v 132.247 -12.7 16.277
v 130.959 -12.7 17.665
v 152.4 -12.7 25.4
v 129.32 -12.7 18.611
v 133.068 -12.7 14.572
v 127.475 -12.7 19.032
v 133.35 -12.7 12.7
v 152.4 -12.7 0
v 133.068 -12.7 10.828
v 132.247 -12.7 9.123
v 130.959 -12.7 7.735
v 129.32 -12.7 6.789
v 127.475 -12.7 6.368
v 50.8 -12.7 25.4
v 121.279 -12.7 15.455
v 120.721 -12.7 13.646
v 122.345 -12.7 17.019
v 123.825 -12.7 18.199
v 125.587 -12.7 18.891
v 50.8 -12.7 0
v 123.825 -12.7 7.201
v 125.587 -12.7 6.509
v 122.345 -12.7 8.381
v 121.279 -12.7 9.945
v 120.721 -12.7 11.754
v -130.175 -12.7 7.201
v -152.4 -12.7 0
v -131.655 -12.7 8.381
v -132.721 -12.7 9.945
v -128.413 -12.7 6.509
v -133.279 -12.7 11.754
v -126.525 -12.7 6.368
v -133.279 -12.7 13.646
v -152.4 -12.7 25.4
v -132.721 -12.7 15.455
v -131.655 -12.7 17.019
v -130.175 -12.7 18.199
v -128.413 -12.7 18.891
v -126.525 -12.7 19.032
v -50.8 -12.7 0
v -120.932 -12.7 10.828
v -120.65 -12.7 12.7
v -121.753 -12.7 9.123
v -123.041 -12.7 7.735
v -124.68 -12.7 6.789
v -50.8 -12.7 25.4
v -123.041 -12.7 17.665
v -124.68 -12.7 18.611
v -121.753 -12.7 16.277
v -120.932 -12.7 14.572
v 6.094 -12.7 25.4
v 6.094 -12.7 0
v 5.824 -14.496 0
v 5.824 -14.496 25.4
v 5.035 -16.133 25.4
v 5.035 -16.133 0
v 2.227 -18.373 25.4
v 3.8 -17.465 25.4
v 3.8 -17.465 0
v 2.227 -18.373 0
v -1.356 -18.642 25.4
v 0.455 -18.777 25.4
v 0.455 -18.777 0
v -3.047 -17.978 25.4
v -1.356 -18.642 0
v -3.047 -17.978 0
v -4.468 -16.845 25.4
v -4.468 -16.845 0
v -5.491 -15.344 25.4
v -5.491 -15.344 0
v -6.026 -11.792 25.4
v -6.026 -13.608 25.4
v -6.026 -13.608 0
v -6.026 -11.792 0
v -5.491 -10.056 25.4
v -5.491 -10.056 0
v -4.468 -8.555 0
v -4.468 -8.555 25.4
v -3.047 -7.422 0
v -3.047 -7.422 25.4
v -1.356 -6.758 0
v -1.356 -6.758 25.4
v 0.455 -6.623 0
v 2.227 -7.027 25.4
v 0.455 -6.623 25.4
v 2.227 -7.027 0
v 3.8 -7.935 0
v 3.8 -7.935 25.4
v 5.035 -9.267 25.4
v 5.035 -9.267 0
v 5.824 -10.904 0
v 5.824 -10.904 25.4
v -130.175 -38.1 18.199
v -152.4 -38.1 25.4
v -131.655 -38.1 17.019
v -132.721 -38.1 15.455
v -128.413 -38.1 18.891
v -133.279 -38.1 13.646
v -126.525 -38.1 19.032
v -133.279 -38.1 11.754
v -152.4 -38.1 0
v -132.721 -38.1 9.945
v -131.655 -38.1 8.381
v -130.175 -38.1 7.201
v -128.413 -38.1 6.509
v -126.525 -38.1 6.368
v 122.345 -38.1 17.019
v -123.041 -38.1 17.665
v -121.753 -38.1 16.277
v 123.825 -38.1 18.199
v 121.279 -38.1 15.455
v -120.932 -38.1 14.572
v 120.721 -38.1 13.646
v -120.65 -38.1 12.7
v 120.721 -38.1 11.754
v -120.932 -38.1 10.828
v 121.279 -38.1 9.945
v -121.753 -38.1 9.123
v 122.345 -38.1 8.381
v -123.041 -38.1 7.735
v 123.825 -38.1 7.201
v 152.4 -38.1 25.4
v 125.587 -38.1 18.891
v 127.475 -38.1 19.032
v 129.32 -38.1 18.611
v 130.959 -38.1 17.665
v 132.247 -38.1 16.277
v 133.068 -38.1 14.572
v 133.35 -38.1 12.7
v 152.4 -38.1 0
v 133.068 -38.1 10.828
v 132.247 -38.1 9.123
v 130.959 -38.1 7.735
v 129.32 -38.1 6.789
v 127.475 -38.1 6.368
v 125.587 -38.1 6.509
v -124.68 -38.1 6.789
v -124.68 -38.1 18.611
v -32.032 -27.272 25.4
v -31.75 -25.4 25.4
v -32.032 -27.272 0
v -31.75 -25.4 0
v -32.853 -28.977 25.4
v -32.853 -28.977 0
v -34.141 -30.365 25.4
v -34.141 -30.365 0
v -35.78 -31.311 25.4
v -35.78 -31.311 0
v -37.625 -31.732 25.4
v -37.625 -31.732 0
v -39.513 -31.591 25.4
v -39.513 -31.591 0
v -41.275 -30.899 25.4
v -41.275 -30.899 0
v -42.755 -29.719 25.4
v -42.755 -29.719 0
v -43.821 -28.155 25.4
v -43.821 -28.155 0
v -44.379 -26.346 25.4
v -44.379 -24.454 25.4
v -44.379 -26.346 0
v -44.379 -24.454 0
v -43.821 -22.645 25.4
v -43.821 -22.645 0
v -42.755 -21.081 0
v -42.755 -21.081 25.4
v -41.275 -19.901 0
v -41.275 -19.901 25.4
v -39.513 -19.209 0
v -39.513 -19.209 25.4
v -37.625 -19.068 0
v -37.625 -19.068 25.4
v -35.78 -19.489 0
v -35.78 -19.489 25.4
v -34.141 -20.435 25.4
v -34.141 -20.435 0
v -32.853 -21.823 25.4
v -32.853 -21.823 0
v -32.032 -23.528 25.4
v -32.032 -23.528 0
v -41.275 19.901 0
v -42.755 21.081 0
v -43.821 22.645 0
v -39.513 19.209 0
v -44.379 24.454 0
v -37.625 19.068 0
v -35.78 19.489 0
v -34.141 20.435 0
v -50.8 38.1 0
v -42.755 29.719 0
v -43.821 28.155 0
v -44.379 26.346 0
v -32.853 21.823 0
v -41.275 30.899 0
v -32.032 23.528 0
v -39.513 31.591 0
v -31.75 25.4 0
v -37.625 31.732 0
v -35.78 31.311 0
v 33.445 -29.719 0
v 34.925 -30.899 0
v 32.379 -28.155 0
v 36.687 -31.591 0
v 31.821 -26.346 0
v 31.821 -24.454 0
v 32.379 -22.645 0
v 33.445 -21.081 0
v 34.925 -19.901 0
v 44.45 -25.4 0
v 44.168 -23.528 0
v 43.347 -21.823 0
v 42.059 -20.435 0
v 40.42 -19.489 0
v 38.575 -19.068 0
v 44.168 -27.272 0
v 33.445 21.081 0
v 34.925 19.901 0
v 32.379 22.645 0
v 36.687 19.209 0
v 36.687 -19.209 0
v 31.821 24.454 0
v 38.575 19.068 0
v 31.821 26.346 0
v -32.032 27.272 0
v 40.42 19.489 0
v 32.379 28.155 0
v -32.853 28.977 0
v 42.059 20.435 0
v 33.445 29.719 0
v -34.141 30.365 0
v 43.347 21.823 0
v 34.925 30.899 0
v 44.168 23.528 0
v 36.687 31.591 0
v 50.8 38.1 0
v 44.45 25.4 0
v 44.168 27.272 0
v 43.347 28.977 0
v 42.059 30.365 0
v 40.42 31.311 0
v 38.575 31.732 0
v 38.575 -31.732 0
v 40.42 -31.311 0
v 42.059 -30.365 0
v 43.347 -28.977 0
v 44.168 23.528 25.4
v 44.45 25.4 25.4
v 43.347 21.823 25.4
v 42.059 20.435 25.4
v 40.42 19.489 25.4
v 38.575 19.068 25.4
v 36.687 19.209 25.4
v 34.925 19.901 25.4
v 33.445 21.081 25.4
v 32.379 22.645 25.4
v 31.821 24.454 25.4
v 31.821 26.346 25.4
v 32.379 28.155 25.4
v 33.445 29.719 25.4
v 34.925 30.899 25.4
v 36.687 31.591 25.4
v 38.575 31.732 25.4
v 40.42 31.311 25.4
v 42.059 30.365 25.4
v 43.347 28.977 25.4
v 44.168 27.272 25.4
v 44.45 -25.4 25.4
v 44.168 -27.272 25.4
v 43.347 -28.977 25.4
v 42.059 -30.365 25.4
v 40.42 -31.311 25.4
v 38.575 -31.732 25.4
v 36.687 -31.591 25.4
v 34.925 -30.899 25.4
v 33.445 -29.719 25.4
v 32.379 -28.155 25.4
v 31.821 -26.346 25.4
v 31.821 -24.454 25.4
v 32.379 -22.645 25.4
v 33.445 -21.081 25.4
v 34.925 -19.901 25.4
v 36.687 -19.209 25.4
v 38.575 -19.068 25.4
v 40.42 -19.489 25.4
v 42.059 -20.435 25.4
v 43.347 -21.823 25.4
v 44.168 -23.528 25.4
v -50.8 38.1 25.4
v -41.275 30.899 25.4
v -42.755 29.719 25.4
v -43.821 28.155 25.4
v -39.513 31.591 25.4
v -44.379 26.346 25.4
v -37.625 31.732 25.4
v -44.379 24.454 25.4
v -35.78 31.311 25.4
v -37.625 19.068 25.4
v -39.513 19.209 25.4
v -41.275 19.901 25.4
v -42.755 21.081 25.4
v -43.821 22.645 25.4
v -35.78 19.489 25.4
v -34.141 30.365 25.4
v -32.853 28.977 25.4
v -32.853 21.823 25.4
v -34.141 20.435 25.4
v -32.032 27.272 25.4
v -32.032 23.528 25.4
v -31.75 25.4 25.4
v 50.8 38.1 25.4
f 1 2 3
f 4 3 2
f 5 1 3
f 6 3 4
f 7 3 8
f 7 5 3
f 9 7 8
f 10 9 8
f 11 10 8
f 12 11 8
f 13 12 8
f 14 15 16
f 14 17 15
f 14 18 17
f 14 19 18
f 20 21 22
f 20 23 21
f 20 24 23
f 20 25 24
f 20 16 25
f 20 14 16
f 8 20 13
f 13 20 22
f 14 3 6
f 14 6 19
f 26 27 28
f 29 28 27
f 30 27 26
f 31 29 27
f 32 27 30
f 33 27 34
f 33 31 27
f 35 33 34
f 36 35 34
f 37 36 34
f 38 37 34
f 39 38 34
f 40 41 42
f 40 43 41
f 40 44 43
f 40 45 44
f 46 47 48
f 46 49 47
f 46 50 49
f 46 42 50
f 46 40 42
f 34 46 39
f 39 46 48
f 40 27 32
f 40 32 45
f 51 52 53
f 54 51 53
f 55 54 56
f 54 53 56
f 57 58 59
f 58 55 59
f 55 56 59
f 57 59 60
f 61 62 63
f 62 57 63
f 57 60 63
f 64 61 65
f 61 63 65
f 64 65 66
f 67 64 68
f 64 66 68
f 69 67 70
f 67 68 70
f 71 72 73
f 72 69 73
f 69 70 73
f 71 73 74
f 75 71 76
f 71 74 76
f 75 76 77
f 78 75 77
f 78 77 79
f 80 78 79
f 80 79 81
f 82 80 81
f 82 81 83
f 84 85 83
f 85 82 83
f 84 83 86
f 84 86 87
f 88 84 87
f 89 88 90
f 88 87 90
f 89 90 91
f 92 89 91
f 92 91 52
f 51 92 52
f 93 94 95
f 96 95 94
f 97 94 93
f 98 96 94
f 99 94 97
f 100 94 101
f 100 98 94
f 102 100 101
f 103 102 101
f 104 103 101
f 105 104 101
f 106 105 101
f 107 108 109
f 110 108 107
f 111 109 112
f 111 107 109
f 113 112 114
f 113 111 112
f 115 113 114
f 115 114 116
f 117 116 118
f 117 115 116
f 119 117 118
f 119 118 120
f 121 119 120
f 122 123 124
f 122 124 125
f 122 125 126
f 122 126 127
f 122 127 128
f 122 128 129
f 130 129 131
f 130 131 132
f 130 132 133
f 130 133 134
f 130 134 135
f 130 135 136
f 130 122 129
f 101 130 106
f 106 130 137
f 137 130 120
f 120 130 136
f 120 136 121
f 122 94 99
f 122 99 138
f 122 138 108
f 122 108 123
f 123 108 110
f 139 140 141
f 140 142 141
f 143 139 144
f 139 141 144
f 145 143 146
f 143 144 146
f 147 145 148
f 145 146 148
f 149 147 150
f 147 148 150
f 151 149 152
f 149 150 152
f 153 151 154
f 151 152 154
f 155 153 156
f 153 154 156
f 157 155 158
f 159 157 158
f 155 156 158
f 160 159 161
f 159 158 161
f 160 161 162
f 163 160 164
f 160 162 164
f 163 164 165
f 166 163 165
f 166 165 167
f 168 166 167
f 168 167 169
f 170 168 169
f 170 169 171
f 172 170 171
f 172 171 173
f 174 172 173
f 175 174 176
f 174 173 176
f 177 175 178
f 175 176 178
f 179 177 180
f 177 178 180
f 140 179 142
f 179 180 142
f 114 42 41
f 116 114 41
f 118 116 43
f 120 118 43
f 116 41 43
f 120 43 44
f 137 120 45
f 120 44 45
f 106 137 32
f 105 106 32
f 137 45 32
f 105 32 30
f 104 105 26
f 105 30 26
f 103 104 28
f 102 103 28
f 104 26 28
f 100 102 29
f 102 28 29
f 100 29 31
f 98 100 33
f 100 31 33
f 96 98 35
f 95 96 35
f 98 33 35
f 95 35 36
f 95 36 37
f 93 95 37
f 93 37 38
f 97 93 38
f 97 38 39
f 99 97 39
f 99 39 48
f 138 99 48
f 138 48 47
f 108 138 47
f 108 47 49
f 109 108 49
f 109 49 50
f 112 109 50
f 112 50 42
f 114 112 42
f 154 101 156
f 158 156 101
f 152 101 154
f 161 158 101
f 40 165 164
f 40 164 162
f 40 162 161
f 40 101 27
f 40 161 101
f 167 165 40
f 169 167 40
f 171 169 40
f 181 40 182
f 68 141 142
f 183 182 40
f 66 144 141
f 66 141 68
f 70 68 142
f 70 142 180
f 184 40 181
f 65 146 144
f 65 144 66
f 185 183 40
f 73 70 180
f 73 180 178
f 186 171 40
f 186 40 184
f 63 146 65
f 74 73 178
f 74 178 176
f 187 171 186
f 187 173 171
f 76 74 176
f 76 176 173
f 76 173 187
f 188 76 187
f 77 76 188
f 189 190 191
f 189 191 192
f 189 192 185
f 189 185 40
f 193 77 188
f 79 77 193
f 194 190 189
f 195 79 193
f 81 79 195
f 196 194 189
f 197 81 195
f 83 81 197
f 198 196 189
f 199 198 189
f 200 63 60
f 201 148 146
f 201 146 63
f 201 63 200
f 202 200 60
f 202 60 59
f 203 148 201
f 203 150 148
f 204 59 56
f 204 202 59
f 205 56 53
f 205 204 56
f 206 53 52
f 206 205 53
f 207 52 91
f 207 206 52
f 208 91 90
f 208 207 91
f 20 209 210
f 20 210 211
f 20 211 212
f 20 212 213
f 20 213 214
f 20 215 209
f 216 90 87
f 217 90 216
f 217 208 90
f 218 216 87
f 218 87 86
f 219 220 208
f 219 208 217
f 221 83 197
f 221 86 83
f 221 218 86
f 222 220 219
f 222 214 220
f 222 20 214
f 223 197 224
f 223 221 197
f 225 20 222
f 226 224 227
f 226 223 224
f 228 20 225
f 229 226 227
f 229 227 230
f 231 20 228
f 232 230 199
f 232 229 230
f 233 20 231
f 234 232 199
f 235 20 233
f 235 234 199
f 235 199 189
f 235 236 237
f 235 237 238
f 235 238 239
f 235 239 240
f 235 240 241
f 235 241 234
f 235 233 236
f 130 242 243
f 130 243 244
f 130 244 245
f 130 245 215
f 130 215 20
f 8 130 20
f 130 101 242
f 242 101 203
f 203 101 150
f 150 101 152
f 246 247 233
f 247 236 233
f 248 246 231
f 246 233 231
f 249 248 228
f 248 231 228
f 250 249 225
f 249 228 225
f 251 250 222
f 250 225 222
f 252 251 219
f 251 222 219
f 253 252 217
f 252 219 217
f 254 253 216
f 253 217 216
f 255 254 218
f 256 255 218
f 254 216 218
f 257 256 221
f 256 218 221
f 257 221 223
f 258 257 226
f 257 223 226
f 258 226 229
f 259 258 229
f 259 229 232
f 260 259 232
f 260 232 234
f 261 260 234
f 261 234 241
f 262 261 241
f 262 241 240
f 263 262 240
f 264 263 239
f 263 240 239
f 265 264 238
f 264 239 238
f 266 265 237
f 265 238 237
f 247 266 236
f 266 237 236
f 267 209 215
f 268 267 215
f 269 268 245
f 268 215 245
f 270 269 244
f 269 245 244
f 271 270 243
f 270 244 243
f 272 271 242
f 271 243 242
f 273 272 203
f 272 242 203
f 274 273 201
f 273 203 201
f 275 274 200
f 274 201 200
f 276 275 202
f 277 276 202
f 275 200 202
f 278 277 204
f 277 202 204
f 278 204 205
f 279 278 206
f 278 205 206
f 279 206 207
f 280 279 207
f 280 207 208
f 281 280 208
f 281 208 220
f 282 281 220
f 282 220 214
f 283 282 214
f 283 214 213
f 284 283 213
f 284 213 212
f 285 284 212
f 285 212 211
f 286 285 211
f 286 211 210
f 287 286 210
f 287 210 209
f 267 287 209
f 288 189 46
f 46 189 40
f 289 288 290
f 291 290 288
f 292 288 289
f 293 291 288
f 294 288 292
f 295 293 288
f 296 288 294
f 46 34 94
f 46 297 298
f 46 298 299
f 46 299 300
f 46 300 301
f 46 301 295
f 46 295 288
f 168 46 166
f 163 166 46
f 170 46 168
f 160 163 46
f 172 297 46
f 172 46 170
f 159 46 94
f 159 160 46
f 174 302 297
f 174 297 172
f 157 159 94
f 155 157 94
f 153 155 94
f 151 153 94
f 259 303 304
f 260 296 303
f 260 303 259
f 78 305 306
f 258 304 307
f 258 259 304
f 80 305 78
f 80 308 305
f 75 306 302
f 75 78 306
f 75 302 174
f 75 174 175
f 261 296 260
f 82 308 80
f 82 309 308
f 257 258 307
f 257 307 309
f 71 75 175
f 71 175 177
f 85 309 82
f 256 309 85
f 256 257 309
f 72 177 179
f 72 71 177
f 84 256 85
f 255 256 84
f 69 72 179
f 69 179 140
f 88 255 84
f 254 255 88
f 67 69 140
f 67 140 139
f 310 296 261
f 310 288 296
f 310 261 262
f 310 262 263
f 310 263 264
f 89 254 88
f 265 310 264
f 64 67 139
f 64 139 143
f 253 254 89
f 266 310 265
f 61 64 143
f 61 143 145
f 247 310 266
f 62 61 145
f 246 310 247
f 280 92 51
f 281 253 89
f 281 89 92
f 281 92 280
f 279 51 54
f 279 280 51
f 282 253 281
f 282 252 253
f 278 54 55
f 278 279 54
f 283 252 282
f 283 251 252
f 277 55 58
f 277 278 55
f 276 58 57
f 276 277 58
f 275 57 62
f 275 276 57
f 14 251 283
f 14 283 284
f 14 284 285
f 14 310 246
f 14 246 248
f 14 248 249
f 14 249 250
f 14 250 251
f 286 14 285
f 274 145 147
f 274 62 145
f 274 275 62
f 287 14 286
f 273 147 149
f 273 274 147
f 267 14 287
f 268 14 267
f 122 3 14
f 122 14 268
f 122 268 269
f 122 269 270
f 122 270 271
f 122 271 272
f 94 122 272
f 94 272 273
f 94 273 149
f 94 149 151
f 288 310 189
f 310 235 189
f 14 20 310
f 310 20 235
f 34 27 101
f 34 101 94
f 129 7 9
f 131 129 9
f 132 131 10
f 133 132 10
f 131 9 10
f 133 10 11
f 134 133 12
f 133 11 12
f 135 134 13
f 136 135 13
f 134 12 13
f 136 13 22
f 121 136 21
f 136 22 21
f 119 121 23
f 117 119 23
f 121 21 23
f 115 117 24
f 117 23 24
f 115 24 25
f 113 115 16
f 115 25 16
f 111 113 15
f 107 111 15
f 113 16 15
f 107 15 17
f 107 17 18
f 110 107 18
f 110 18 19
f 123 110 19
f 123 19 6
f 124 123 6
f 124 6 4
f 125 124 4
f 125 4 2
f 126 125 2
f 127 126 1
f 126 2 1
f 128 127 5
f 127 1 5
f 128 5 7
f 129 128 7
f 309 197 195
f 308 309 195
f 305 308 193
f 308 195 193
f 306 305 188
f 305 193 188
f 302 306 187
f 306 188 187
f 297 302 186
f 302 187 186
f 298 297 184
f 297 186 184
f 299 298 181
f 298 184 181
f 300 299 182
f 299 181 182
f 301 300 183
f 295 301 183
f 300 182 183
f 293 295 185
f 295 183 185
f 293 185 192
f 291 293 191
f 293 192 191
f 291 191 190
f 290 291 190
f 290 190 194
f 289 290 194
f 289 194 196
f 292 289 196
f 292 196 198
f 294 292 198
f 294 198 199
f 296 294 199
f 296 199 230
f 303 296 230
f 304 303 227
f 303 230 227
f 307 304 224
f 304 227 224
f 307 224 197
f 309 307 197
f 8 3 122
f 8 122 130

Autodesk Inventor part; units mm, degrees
ref_plane "YZ Plane" through (0, 0, 0) normal (1, 0, 0) x (0, 1, 0)
ref_plane "XZ Plane" through (0, 0, 0) normal (0, 1, 0) x (-1, 0, 0)
ref_plane "XY Plane" through (0, 0, 0) normal (0, 0, 1) x (1, 0, 0)
sketch "Sketch1" plane through (0, 0, 0) normal (0, 0, 1) x (1, 0, 0)
  line L0 (-50.8, -38.1) -> (50.8, -38.1)
  line L1 (50.8, -38.1) -> (50.8, 38.1)
  line L2 (50.8, 38.1) -> (-50.8, 38.1)
  line L3 (-50.8, 38.1) -> (-50.8, -38.1)
  line L4 (-50.8, -38.1) -> (50.8, 38.1) construction
  line L5 (50.8, -38.1) -> (-50.8, 38.1) construction
  line L6 (-38.1, -25.4) -> (38.1, -25.4)
  line L7 (38.1, -25.4) -> (38.1, 25.4)
  line L8 (38.1, 25.4) -> (-38.1, 25.4)
  line L9 (-38.1, 25.4) -> (-38.1, -25.4)
  line L10 (-38.1, -25.4) -> (38.1, 25.4) construction
  line L11 (38.1, -25.4) -> (-38.1, 25.4) construction
  circle A0 centre (-38.1, 25.4) radius 6.35
  circle A1 centre (38.1, 25.4) radius 6.35
  circle A2 centre (-38.1, -25.4) radius 6.35
  circle A3 centre (38.1, -25.4) radius 6.35
  circle A4 centre (0, -12.7) radius 6.0944
  point P0 (0, 0)
  dimension "d0" = 101.6
  dimension "d1" = 76.2
  dimension "d2" = 76.2
  dimension "d3" = 50.8
  dimension "d4" = 12.7
  dimension "d7" = 50.8
extrude "Extrusion1" add sketch "Sketch1" along normal blind 25.4 contours L3 L2 L1 L0 | A2 L9 A0 L8 A1 L7 A3 L6
sketch "Sketch2" plane through (50.8, -38.1, 0) normal (1, 0, 0) x (0, 0, -1)
  line L0 (0, 76.2) -> (0, 0) projected
  line L1 (0, 0) -> (-25.4, 0)
  line L2 (-25.4, 0) -> (-25.4, 25.4)
  line L3 (-25.4, 25.4) -> (0, 25.4)
  line L4 (0, 25.4) -> (0, 0)
  line L5 (0, 76.2) -> (-25.4, 76.2) projected
  point P0 (0, 38.1)
  point P1 (0, 25.4)
  dimension "d8" = 25.4
extrude "Extrusion2" add sketch "Sketch2" along normal blind 101.6
mirror "Mirror1" about plane through (0, 0, 0) normal (1, 0, 0) of "Extrusion2"
sketch "Sketch3" plane through (50.8, -12.7, 25.4) normal (0, 1, 0) x (1, 0, 0)
  line L0 (0, 0) -> (-101.6, 0) projected
  line L1 (-50.8, 0) -> (-50.8, 25.4) construction
  line L2 (-203.2, 25.4) -> (-203.2, 0) projected
  line L3 (-203.2, 12.7) -> (101.6, 12.7) construction
  line L4 (101.6, 0) -> (101.6, 25.4) projected
  circle A0 centre (76.2, 12.7) radius 6.35
  circle A1 centre (-177.8, 12.7) radius 6.35
  dimension "d11" = 12.7
  dimension "d12" = 127
extrude "Extrusion3" cut sketch "Sketch3" against normal through all
properties part number "center block"
